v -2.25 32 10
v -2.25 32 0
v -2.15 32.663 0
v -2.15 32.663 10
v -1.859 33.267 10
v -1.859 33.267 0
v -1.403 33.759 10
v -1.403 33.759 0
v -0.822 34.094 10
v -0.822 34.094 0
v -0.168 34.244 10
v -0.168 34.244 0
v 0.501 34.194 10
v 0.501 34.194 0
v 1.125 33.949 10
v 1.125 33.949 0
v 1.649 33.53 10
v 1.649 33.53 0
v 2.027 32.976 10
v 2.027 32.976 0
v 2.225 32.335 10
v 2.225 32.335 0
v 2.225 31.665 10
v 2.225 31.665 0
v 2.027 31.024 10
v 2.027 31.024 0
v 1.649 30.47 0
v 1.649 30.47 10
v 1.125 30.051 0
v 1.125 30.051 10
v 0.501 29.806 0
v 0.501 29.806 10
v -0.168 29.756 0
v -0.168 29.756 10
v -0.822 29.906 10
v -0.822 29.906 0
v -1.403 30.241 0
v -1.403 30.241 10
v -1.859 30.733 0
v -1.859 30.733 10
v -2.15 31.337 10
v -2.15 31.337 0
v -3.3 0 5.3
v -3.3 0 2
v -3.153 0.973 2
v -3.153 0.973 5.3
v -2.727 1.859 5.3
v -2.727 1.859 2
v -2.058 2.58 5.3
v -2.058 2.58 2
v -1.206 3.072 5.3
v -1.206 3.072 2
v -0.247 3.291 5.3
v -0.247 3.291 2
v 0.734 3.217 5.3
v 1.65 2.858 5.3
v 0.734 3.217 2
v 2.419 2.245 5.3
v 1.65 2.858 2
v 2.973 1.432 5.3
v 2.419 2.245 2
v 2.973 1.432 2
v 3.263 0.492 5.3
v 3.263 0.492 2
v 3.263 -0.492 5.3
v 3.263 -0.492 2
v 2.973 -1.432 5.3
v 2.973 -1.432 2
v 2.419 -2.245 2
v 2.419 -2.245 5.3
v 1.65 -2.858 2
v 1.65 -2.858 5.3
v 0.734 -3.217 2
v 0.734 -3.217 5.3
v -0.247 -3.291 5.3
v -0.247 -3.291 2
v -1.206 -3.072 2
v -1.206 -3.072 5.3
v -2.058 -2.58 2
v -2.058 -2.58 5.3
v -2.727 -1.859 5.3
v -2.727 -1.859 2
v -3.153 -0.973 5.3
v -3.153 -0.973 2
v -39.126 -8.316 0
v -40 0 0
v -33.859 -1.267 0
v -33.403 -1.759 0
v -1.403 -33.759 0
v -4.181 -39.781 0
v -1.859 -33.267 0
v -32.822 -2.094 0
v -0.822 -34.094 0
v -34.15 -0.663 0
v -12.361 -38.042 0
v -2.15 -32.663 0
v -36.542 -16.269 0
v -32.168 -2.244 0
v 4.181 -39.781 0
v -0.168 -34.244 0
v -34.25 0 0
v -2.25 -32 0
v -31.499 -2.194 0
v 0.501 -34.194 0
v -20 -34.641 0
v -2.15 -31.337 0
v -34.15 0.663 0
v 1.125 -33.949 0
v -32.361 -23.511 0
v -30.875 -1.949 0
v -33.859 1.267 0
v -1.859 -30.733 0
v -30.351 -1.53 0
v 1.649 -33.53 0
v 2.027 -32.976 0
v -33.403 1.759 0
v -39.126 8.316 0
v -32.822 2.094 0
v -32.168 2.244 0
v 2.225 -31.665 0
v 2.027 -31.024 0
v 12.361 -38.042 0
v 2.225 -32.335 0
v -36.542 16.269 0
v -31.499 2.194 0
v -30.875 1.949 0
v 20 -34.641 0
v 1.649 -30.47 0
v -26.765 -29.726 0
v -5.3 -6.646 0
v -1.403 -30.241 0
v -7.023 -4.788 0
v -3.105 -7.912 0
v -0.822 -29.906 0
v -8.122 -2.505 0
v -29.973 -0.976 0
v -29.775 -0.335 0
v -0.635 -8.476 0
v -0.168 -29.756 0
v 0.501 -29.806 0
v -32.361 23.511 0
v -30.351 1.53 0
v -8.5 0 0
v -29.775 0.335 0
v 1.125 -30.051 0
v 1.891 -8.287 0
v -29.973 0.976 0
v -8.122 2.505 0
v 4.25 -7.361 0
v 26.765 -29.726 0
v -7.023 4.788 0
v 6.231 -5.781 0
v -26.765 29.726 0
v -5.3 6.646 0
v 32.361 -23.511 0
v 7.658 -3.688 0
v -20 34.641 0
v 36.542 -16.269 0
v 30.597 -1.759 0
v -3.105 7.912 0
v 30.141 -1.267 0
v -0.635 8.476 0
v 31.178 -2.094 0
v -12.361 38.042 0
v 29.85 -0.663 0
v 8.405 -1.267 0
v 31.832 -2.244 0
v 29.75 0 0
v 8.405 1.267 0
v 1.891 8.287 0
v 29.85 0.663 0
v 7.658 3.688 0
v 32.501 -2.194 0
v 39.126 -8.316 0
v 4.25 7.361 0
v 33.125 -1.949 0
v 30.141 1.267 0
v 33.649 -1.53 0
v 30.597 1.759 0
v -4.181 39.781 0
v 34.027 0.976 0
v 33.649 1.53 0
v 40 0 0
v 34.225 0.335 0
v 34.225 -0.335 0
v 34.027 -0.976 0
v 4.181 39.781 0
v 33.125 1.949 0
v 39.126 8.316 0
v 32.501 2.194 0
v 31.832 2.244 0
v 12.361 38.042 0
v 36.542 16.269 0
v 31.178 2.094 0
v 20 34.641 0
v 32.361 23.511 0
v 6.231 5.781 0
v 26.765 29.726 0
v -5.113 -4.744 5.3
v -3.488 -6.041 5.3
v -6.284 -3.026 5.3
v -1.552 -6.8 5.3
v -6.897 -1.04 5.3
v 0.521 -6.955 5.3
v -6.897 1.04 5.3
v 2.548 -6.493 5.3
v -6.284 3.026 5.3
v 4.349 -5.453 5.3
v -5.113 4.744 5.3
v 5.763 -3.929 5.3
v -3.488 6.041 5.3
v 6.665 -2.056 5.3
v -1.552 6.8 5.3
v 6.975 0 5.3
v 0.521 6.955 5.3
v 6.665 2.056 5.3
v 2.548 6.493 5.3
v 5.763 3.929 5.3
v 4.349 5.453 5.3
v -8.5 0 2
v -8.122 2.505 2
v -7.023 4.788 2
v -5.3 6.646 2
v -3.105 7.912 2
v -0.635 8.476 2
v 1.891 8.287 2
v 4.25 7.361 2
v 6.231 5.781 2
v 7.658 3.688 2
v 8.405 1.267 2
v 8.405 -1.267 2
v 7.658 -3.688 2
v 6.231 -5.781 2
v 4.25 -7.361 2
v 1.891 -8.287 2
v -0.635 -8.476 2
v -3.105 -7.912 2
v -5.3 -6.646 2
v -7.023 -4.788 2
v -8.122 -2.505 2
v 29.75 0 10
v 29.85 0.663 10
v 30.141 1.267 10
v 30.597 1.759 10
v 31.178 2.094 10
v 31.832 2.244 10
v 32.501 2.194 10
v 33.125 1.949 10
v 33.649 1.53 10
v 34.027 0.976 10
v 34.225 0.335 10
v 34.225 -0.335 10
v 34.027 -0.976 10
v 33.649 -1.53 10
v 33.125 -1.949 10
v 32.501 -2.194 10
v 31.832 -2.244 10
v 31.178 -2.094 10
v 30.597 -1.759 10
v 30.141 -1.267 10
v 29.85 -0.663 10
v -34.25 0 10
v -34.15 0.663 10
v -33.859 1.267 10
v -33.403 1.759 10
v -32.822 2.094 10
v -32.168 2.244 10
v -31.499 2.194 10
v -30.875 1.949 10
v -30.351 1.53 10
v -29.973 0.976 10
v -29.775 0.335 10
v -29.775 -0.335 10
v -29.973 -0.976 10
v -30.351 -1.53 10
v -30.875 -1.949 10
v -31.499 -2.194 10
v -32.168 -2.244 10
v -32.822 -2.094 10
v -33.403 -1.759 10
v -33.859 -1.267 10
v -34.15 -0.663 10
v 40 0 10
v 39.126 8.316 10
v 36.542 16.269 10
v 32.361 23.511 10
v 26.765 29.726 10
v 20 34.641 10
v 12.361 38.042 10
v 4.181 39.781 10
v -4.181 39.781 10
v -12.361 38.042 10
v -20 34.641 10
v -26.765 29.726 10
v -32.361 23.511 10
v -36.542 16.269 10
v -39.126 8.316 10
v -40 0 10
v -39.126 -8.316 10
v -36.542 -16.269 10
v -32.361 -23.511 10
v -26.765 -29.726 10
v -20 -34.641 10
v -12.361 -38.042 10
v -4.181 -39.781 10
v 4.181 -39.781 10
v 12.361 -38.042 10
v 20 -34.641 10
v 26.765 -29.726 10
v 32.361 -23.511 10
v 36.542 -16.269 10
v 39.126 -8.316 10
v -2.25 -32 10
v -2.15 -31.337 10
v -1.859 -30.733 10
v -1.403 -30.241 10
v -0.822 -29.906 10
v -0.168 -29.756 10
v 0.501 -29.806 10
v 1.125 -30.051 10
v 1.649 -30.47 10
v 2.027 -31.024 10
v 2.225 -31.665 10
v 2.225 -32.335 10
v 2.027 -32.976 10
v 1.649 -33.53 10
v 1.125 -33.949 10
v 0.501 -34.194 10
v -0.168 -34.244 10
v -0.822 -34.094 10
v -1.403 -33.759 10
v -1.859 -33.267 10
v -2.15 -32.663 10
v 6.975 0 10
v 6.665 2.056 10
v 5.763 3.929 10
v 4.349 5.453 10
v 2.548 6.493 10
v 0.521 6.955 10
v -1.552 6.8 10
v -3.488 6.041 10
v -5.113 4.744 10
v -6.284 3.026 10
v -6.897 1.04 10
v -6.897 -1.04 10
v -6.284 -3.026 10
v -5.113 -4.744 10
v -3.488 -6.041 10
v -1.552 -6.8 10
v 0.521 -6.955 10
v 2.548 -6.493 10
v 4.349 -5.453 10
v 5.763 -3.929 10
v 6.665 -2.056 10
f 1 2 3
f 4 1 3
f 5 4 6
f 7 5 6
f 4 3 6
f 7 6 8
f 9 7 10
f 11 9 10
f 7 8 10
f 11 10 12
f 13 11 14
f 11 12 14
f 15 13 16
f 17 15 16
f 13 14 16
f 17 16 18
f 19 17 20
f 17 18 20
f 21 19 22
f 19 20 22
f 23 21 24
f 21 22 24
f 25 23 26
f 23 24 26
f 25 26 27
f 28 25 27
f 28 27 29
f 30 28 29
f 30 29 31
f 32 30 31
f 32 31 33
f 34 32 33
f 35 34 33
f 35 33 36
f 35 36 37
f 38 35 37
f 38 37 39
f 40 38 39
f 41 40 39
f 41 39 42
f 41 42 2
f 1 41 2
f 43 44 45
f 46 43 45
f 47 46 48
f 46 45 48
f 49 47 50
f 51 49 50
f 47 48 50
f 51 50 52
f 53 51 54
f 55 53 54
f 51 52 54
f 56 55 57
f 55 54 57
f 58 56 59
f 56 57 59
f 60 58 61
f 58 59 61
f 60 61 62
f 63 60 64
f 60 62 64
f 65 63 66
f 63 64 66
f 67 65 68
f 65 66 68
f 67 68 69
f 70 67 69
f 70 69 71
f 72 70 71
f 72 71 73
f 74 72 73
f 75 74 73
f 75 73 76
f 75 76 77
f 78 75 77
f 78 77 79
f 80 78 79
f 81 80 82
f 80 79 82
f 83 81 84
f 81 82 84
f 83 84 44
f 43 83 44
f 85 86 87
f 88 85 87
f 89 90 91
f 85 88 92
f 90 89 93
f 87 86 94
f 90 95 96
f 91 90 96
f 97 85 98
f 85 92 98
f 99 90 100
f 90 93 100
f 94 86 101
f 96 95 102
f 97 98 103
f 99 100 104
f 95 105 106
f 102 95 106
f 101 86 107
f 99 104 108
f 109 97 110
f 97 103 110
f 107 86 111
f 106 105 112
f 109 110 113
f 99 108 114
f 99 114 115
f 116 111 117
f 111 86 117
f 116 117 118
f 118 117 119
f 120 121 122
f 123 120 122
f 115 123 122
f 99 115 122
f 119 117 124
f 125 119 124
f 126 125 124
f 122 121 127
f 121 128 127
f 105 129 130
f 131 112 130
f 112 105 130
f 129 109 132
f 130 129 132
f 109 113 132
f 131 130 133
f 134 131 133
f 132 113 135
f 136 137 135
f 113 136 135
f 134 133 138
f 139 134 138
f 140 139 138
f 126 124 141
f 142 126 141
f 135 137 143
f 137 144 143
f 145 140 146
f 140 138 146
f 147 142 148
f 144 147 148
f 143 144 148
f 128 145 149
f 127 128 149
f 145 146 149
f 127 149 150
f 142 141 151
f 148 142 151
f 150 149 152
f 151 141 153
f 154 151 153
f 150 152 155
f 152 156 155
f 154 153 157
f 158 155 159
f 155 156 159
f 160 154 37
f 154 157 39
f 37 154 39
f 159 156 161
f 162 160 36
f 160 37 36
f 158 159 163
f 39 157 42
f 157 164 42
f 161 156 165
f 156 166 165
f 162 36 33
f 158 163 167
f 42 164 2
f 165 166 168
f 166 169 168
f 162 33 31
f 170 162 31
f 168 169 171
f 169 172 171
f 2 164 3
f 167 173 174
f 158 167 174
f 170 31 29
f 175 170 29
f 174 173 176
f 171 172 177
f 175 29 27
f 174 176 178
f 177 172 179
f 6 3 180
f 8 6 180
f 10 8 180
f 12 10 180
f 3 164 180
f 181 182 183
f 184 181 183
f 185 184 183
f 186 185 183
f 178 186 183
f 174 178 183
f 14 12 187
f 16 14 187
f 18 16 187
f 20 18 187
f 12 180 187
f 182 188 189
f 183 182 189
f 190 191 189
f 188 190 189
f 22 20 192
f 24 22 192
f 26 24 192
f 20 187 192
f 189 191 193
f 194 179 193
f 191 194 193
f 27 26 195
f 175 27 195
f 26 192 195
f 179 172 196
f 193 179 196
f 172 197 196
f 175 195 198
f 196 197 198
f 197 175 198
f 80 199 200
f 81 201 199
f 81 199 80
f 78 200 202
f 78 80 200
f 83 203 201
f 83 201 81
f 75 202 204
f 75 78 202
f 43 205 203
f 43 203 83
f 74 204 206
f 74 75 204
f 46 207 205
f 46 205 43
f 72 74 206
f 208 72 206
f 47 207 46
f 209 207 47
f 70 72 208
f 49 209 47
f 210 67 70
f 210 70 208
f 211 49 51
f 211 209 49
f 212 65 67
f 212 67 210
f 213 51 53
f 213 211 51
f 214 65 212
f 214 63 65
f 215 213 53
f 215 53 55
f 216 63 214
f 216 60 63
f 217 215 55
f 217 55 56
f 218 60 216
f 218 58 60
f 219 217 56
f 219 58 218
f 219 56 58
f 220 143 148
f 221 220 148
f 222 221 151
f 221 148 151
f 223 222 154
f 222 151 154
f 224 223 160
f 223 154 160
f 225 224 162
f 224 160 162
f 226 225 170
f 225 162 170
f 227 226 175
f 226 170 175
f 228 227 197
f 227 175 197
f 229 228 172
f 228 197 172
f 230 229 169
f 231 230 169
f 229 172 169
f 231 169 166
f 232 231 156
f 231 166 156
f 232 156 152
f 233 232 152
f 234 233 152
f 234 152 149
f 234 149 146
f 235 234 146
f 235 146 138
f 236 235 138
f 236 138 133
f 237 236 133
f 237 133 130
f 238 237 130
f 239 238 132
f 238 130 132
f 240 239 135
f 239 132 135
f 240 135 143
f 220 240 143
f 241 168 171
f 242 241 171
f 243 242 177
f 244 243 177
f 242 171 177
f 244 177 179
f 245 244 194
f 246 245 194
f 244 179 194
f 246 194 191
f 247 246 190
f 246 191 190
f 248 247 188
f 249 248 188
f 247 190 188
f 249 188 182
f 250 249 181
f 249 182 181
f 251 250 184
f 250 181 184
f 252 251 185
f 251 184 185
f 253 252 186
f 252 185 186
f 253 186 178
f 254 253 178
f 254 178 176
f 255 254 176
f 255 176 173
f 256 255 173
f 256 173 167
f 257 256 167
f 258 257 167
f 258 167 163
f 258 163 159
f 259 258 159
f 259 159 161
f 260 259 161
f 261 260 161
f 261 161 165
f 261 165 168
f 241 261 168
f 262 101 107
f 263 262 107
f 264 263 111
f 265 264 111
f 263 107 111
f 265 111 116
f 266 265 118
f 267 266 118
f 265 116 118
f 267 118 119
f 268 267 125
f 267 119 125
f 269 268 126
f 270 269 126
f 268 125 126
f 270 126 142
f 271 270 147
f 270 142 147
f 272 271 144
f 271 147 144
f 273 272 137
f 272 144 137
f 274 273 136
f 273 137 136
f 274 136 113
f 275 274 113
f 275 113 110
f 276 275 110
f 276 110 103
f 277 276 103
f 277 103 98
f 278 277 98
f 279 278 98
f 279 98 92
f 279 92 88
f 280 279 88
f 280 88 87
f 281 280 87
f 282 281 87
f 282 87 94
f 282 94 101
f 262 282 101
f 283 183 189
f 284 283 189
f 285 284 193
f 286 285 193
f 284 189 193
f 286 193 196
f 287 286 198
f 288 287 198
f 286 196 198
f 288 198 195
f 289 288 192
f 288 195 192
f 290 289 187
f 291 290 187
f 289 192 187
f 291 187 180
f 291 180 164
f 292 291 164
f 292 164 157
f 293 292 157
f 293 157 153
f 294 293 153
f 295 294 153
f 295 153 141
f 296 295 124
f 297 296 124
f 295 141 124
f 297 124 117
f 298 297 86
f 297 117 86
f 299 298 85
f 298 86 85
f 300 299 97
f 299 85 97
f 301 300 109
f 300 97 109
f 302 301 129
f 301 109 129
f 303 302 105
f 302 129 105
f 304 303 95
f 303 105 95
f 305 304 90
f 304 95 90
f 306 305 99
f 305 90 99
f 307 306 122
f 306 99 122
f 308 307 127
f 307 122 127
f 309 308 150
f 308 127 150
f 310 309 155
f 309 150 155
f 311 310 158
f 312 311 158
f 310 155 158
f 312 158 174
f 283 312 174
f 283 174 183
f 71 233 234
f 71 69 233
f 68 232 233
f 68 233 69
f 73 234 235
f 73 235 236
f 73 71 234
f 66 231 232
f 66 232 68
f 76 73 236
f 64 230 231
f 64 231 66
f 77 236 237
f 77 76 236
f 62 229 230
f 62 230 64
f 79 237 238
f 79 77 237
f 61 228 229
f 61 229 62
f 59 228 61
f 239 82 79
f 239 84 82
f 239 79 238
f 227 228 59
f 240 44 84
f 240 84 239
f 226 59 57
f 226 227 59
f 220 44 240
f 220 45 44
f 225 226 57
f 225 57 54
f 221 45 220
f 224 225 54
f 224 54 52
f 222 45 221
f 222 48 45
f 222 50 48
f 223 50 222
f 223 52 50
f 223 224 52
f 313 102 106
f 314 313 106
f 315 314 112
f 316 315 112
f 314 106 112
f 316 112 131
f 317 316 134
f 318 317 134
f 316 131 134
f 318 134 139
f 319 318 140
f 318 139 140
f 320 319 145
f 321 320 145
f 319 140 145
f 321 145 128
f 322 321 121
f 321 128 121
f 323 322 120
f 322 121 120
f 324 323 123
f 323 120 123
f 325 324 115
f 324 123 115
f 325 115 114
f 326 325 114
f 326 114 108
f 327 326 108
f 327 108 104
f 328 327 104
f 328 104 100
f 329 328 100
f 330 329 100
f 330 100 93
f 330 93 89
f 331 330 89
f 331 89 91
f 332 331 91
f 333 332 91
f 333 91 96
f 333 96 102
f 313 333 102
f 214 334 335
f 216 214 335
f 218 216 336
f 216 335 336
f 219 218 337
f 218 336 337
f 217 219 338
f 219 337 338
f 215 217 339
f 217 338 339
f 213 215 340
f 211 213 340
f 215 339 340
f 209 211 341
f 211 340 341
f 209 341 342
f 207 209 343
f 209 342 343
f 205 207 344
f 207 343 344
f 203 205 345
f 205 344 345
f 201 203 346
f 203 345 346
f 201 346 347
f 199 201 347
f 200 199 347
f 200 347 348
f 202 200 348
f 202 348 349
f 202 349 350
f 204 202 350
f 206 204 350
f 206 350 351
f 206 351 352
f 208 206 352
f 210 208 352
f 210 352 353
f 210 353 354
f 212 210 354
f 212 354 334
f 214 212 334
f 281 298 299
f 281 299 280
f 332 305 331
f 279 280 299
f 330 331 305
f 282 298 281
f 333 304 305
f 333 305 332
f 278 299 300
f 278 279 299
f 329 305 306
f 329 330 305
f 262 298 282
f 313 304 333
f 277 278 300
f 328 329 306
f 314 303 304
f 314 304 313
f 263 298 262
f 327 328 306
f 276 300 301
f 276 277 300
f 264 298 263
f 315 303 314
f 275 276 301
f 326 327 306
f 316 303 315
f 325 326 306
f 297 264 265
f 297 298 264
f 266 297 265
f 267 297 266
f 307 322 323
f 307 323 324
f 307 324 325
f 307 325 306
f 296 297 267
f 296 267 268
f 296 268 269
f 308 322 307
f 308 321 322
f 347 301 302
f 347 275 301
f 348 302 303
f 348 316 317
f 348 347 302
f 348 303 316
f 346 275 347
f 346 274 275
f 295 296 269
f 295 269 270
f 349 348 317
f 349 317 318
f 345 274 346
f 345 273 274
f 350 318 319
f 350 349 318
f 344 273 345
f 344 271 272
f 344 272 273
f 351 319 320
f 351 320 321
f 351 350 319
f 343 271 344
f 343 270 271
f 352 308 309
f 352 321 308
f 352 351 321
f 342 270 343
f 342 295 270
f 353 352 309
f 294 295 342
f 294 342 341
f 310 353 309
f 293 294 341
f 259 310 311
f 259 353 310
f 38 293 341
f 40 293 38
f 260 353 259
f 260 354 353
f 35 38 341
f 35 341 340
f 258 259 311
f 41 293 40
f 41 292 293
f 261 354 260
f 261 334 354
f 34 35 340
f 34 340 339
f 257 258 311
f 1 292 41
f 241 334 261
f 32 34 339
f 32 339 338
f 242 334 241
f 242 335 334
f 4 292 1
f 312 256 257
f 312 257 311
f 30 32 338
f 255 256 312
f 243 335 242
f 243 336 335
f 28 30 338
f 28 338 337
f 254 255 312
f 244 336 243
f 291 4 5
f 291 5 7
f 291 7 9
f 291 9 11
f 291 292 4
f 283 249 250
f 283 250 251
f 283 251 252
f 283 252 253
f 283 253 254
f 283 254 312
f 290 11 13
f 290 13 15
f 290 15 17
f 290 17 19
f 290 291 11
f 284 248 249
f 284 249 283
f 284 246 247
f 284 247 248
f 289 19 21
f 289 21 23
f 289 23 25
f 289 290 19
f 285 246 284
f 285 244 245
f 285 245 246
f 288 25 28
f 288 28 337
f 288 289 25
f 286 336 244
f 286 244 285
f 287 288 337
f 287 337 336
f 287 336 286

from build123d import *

# Parameters (mm, degrees)
SKETCH1_R                                        = 40
BOSS_EXTRUDE1_DEPTH                              = 10
CBORE_FOR_M6_HEX_HEAD_MACHINE_SCREW1_D           = 6.6
CBORE_FOR_M6_HEX_HEAD_MACHINE_SCREW1_CBORE_D     = 13.95
CBORE_FOR_M6_HEX_HEAD_MACHINE_SCREW1_CBORE_DEPTH = 4.7
M4_CLEARANCE_HOLE1_D                             = 4.5
SKETCH6_R                                        = 8.5
CUT_EXTRUDE1_DEPTH                               = 2


with BuildPart() as part:
    # Sketch1 → Boss-Extrude1 (new body)
    with BuildSketch(Plane.XY):
        Circle(SKETCH1_R)
    extrude(amount=BOSS_EXTRUDE1_DEPTH)

    # CBORE for M6 Hex Head Machine Screw1 (through all)
    with Locations(Plane.XY.offset(10)):
        with Locations((0, 0)):
            CounterBoreHole(CBORE_FOR_M6_HEX_HEAD_MACHINE_SCREW1_D / 2, CBORE_FOR_M6_HEX_HEAD_MACHINE_SCREW1_CBORE_D / 2, CBORE_FOR_M6_HEX_HEAD_MACHINE_SCREW1_CBORE_DEPTH)

    # M4 Clearance Hole1 (through all)
    with Locations(Plane.XY.offset(10)):
        with Locations((0, 32), (32, 0), (0, -32), (-32, 0)):
            Hole(M4_CLEARANCE_HOLE1_D / 2)

    # Sketch6 → Cut-Extrude1 (cut)
    with BuildSketch(Plane(origin=(0, 0, 0), x_dir=(-1, 0, 0), z_dir=(0, 0, -1))):
        Circle(SKETCH6_R)
    extrude(amount=-CUT_EXTRUDE1_DEPTH, mode=Mode.SUBTRACT)


solid = part.part
